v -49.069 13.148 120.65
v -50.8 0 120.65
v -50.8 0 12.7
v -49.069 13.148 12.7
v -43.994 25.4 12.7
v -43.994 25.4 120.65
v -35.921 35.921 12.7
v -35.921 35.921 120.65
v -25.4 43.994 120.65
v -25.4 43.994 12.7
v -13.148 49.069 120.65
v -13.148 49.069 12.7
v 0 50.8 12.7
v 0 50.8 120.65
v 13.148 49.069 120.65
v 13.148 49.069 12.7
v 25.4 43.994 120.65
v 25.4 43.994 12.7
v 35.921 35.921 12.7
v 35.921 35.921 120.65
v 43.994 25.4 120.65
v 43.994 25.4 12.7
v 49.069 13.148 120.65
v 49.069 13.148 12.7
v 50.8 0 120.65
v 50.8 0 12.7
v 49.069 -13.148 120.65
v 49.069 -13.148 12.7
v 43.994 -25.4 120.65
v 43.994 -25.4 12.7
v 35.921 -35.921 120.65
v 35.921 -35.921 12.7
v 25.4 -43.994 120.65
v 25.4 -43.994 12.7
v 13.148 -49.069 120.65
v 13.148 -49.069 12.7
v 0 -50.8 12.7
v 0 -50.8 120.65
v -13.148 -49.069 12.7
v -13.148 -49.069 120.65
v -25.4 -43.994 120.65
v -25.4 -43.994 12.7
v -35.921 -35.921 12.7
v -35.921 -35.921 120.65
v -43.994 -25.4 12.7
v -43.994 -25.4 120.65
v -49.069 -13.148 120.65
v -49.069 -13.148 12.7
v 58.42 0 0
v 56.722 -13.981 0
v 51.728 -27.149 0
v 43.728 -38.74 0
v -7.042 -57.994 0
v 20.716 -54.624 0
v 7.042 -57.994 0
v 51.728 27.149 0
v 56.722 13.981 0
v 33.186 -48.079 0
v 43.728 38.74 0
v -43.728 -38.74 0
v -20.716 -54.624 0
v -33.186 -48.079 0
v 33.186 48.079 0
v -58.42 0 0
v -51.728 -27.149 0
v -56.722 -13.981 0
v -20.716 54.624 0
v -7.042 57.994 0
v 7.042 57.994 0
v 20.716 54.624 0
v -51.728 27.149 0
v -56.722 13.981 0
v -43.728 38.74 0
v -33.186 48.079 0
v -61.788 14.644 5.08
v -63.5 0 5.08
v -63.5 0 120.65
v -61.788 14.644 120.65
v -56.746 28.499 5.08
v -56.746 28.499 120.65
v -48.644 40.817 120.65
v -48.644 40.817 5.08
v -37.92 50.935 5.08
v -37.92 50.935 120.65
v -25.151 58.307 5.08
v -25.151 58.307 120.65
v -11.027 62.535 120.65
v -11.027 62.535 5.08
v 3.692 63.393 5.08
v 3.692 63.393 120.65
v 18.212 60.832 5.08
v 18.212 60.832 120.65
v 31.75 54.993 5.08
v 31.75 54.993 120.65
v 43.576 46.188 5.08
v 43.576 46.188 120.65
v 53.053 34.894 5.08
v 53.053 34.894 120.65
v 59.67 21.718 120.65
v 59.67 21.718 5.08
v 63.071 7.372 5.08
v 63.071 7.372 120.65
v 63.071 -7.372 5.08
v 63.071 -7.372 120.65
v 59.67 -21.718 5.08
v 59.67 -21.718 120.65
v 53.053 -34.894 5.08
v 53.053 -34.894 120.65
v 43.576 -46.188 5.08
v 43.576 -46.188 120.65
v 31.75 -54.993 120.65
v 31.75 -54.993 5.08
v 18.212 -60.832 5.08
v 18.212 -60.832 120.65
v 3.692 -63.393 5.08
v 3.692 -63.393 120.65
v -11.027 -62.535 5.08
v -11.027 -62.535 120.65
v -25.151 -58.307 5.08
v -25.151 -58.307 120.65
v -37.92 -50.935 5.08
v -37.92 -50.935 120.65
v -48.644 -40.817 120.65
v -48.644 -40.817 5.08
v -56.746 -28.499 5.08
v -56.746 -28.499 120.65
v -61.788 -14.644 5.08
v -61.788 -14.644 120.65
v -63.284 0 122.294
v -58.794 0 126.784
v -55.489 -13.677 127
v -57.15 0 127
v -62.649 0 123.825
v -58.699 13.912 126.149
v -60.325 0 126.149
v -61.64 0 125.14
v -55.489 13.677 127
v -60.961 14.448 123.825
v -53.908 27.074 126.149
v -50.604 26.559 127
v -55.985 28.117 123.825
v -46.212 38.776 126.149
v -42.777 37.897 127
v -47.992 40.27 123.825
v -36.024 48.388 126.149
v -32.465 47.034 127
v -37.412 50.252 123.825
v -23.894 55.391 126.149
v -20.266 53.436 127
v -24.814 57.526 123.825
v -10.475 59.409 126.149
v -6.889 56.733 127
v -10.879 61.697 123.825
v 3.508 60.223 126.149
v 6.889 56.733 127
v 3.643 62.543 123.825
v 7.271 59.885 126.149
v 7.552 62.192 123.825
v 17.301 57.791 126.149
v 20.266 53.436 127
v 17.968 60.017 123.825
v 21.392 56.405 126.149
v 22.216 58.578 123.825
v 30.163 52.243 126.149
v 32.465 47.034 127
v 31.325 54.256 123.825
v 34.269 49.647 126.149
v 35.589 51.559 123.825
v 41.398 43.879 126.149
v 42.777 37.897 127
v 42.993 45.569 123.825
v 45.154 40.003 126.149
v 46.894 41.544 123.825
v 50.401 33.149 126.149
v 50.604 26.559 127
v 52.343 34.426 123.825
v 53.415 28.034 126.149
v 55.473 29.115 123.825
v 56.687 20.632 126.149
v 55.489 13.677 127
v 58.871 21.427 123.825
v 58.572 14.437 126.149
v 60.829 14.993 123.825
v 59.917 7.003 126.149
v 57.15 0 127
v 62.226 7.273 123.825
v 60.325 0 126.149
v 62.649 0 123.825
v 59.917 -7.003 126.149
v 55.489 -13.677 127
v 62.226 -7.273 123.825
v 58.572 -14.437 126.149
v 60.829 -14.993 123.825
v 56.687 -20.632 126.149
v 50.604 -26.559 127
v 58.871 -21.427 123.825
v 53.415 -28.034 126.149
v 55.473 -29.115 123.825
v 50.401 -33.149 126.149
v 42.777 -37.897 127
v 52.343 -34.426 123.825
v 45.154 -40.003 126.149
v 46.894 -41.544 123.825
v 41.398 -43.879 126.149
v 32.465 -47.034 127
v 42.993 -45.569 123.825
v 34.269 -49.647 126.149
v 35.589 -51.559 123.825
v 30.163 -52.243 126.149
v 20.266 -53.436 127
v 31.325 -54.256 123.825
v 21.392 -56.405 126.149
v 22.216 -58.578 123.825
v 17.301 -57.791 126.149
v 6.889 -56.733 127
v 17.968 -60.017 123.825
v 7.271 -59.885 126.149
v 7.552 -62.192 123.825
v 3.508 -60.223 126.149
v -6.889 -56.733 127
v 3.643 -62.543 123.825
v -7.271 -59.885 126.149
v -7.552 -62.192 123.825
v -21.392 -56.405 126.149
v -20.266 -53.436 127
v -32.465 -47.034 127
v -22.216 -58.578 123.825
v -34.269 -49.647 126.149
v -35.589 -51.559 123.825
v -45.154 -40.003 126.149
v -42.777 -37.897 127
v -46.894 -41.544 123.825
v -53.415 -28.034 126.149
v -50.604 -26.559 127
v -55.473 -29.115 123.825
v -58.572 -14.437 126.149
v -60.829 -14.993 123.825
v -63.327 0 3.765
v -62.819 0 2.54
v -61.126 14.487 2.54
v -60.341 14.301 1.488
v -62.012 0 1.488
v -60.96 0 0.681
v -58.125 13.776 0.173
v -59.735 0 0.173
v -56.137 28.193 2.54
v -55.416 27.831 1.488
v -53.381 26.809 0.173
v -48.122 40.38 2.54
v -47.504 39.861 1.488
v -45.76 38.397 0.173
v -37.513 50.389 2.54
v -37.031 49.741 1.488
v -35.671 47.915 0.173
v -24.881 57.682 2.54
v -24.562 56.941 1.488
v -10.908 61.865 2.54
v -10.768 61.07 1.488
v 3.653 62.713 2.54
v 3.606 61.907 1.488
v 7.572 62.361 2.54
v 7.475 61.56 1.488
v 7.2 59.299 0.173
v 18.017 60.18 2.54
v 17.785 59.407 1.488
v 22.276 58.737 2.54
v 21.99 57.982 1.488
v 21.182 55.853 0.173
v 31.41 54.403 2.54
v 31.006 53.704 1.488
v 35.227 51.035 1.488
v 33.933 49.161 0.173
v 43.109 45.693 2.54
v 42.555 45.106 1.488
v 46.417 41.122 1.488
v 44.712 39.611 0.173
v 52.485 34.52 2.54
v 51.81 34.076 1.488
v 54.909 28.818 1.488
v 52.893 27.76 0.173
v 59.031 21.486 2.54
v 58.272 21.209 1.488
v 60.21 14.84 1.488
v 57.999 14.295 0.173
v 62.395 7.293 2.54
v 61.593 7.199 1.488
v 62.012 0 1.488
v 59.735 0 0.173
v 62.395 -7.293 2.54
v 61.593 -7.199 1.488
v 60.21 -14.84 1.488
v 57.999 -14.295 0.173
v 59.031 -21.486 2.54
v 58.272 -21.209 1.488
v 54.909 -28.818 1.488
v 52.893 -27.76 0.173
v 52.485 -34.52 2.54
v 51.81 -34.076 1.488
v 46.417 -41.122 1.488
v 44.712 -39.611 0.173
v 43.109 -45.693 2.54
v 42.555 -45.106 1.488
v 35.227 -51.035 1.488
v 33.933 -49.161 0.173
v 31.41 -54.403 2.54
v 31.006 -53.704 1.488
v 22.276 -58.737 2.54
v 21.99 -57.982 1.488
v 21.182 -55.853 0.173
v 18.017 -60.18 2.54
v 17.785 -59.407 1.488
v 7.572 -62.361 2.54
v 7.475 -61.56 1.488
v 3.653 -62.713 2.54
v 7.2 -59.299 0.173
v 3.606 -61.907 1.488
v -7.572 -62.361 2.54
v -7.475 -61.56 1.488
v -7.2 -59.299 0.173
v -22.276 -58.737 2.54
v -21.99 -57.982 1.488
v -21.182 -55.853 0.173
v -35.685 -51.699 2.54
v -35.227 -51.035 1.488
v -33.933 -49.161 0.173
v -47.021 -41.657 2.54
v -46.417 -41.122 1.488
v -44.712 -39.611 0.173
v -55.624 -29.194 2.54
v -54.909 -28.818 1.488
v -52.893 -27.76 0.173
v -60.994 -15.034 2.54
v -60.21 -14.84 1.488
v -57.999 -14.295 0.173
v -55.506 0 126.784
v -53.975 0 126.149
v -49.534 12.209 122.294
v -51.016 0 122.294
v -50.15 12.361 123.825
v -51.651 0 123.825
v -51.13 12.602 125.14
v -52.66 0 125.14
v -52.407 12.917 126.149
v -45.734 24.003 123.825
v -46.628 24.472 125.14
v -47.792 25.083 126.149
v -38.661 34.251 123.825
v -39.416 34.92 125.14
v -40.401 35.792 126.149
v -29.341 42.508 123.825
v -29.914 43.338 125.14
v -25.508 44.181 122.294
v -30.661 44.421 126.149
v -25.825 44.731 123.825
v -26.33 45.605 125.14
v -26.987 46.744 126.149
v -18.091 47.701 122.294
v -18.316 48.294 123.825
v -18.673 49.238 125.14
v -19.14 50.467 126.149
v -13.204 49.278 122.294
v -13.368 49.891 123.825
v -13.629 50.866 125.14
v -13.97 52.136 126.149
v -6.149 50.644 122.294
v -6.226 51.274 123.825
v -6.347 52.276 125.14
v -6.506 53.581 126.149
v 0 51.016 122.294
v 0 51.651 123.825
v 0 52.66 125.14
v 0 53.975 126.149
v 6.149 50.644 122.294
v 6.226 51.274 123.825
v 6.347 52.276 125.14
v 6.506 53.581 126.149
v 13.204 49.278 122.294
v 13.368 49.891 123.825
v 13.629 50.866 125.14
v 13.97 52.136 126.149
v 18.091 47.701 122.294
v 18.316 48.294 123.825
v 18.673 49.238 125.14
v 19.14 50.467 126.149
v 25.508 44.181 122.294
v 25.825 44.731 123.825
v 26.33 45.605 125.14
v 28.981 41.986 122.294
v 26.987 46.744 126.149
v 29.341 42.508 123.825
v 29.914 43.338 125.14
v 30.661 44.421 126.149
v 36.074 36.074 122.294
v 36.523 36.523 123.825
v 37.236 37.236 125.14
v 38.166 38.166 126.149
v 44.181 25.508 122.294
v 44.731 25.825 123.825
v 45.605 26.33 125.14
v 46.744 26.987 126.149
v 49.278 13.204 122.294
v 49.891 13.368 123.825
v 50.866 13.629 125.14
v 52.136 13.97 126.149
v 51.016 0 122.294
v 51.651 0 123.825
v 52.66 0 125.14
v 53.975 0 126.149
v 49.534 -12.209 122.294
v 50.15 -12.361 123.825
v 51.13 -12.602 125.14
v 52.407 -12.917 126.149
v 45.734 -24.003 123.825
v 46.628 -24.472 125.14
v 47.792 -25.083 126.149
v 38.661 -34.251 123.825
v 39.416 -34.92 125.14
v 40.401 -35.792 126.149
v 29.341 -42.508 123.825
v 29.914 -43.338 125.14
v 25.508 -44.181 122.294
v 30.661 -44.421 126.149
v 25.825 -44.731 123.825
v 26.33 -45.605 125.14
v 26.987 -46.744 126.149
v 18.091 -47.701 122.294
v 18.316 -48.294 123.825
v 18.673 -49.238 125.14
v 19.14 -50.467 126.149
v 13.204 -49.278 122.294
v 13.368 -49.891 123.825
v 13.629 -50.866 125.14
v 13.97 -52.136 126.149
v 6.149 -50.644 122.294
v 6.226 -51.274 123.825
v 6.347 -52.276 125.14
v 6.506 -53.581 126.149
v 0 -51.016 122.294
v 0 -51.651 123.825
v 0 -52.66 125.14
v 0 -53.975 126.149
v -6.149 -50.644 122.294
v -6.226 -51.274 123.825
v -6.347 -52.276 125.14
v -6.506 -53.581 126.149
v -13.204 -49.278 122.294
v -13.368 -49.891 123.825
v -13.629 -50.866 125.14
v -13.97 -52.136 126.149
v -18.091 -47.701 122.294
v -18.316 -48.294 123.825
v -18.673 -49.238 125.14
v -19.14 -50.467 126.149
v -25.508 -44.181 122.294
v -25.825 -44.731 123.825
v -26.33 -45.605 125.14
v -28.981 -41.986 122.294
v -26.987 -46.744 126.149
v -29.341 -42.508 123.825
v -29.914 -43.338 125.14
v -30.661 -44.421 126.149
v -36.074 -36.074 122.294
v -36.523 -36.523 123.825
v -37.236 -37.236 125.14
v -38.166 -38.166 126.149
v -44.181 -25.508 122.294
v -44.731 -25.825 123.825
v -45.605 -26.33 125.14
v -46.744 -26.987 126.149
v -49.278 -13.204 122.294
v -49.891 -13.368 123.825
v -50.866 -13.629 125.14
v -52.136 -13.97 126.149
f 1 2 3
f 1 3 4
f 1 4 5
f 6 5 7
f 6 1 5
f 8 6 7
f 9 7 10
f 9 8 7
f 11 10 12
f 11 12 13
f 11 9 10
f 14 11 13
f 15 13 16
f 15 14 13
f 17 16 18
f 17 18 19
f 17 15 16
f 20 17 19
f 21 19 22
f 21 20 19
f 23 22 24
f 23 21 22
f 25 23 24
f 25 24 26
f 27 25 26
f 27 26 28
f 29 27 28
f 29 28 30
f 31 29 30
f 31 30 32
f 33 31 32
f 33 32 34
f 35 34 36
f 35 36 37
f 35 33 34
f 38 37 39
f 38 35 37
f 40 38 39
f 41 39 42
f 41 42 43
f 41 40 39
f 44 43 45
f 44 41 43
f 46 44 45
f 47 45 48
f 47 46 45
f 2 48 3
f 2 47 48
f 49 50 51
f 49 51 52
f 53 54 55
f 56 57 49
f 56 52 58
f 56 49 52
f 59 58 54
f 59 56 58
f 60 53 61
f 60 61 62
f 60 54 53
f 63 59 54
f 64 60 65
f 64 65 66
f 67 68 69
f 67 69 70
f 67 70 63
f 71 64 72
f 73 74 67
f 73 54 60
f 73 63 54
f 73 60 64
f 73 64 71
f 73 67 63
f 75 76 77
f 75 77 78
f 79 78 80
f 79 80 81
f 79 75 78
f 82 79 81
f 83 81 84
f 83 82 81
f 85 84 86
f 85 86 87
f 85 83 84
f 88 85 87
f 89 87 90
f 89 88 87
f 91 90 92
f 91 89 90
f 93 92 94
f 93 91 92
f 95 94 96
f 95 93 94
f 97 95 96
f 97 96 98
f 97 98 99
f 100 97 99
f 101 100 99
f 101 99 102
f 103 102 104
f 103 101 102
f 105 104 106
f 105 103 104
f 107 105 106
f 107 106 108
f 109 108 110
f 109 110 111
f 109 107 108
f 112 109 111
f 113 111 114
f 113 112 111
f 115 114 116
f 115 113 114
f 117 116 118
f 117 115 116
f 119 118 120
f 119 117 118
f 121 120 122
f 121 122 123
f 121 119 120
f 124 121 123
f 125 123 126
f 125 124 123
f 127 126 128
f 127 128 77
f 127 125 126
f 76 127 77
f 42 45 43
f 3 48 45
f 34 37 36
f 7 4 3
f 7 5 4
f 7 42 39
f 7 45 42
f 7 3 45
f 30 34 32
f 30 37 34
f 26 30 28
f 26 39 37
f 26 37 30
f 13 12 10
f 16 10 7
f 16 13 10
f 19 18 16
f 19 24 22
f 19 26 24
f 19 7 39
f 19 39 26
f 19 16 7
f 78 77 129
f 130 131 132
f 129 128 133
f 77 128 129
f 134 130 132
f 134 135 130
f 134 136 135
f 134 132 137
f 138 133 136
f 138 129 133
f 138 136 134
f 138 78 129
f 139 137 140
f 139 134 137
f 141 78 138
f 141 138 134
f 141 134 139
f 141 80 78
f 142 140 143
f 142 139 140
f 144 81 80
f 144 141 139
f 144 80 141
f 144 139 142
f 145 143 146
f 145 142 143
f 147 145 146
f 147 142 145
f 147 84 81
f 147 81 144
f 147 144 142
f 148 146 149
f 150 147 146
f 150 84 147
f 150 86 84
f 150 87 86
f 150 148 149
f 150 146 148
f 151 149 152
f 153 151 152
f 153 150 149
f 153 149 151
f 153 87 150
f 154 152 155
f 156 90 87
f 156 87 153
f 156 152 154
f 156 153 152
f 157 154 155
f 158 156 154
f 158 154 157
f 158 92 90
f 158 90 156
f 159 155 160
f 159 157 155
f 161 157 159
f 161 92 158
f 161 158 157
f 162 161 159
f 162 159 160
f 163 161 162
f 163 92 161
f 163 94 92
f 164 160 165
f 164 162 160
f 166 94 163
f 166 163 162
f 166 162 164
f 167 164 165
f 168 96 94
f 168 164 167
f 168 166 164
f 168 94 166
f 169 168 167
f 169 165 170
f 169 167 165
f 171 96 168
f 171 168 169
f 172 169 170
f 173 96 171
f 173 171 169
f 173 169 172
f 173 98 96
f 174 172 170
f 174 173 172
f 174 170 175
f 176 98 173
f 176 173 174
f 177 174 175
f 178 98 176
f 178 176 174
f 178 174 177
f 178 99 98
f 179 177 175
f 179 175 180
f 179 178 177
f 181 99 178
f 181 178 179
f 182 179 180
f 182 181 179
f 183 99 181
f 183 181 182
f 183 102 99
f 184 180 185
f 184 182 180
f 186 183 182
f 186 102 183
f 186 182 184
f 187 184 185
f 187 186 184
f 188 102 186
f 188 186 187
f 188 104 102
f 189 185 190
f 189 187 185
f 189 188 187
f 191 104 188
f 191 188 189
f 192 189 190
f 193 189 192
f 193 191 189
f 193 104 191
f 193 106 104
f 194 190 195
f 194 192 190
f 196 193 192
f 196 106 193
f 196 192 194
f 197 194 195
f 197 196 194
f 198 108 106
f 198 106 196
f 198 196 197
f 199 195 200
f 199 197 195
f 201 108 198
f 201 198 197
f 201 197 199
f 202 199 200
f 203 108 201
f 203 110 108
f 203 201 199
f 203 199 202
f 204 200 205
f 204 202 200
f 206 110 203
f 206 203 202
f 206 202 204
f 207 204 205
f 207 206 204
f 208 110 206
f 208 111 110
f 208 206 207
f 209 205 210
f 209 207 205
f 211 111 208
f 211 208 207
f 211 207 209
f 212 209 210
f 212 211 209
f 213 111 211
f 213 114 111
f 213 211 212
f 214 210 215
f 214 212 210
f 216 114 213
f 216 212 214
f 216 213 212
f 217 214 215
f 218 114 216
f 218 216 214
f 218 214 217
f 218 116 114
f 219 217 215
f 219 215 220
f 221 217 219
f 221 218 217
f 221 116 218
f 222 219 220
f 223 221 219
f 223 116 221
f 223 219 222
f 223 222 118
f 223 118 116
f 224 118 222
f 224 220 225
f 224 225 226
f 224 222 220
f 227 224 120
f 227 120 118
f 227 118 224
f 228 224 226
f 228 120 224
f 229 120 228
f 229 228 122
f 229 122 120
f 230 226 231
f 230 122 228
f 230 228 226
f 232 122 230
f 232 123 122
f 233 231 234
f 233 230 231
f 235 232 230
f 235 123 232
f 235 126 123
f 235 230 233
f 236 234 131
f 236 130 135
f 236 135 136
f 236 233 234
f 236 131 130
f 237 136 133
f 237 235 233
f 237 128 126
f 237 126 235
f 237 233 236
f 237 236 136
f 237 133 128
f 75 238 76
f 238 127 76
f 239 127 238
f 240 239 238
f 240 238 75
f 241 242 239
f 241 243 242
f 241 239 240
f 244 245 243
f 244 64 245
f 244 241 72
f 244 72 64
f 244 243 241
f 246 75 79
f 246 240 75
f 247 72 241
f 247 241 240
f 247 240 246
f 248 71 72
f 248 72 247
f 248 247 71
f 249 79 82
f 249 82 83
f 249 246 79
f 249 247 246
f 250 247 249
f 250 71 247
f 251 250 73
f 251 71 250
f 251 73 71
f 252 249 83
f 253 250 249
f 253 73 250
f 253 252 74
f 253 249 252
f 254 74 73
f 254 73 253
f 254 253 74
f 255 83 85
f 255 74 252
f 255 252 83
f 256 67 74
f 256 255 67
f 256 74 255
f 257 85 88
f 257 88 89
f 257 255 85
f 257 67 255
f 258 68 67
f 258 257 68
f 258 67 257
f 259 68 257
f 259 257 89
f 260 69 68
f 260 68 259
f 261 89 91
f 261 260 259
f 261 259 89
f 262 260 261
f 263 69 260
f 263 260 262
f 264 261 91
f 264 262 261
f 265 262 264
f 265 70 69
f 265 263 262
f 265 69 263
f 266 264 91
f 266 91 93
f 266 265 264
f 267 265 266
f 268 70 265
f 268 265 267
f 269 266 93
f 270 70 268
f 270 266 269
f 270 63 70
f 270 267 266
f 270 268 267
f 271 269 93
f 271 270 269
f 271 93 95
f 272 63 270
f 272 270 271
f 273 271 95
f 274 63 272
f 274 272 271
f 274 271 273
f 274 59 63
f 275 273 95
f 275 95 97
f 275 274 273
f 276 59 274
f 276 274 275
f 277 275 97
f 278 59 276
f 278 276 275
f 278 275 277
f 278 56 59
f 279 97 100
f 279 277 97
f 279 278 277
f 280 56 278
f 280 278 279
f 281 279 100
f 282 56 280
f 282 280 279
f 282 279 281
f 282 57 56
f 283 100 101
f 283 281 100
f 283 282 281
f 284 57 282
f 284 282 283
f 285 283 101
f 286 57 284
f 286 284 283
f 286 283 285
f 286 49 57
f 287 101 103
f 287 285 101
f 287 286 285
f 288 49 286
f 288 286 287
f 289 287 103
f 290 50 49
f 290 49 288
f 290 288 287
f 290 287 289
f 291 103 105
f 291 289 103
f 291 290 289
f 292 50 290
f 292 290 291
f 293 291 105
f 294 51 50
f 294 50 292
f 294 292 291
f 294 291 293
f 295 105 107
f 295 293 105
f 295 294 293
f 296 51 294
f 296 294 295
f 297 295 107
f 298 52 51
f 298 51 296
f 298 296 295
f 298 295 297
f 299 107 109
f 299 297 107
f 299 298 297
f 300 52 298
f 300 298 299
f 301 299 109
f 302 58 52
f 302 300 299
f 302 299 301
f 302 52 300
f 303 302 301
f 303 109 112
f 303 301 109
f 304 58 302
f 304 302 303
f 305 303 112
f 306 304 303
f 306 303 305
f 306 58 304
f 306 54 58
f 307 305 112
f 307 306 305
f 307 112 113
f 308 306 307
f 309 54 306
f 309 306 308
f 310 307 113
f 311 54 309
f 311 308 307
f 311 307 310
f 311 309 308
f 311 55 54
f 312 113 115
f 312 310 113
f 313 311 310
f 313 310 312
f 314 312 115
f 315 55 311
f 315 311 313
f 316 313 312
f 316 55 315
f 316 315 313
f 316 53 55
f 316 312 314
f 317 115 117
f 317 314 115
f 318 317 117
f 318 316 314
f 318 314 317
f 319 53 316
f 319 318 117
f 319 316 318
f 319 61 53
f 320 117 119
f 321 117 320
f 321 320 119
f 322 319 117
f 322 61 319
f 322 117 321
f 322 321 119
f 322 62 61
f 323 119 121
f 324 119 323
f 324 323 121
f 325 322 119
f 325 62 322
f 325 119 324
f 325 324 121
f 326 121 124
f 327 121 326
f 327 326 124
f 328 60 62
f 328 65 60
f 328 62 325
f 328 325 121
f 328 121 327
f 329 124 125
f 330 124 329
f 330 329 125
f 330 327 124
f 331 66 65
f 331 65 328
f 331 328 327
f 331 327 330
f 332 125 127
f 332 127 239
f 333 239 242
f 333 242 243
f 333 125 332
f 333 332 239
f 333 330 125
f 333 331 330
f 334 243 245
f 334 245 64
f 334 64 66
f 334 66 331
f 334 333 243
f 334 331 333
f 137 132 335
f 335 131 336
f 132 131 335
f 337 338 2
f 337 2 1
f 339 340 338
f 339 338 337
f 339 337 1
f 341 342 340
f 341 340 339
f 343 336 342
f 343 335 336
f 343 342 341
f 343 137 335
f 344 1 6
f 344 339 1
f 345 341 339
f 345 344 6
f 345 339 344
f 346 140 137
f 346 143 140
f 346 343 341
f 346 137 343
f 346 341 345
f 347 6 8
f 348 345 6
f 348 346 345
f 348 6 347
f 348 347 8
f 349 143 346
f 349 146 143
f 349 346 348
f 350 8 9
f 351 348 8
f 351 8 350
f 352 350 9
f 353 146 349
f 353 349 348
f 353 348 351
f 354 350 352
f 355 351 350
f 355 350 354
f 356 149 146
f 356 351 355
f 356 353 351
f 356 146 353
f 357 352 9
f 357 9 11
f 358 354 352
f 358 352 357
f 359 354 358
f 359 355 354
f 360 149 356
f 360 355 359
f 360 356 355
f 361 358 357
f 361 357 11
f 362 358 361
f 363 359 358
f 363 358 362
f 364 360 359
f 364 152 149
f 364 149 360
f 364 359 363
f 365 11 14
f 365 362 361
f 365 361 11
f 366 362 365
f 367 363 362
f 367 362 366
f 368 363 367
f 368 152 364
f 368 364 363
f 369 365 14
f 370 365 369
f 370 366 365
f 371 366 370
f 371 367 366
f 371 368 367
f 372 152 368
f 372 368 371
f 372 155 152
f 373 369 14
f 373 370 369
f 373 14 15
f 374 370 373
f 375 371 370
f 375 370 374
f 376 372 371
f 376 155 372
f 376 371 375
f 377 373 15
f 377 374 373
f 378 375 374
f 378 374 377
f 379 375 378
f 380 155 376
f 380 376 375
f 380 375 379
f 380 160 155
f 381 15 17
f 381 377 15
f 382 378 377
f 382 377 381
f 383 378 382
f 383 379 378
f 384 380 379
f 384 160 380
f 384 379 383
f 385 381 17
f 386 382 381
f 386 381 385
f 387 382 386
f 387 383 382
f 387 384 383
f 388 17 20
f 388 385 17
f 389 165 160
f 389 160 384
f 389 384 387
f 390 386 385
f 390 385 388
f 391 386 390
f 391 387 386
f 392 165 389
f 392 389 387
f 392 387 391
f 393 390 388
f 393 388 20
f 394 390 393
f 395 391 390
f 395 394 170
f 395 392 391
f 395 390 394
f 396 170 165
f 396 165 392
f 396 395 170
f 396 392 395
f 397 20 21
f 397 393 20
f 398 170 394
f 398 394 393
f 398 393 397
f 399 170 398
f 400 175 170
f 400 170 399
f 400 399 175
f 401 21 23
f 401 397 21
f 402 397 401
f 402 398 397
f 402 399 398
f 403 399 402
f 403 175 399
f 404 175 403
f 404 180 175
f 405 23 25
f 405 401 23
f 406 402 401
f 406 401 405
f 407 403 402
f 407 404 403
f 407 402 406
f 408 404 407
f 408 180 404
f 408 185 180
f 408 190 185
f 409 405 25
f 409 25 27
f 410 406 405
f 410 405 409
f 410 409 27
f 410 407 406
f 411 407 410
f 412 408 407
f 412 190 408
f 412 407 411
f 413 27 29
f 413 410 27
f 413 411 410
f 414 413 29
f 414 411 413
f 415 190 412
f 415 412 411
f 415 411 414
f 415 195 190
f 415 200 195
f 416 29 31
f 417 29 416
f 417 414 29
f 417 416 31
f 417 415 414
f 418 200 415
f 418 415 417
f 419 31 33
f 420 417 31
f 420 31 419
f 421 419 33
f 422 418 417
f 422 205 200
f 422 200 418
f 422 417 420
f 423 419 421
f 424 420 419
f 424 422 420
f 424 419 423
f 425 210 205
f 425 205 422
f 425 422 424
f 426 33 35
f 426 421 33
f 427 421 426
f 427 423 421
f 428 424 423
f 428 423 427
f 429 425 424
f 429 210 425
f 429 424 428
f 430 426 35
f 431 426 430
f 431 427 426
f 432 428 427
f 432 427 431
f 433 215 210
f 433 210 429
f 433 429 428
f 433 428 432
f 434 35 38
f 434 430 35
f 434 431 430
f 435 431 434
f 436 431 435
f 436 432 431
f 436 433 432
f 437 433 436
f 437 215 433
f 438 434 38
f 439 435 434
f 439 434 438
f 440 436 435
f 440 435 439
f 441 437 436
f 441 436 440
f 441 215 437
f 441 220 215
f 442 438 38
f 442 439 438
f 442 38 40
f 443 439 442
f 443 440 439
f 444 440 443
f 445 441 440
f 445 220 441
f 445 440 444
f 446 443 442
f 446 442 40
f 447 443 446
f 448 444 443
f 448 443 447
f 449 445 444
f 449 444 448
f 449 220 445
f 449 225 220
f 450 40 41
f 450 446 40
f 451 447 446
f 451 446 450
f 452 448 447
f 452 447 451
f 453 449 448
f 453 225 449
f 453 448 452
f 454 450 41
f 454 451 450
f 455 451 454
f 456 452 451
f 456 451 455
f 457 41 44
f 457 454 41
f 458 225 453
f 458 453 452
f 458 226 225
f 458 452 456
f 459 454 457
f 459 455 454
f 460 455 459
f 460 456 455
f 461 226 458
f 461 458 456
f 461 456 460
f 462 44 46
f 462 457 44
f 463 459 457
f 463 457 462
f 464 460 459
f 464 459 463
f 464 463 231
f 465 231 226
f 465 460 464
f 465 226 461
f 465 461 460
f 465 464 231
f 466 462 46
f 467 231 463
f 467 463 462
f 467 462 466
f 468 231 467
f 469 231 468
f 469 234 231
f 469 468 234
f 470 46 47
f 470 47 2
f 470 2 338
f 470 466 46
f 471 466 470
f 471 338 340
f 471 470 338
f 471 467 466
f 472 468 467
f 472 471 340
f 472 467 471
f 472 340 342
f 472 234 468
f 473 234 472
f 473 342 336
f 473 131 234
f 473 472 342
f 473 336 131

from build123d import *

# Parameters (mm, degrees)
F2_R = 6.34999
F3_R = 5.08


# Not quite as in the source:
# - a fillet or chamfer is up to 0.001 mm smaller than in the source, because OpenCascade refuses the exact size


with BuildPart() as f1:
    # F0 (on Front) → F1 (revolve)
    with BuildSketch(Plane.XZ):
        Polygon((-63.5, 0), (0, 0), (0, 12.7), (-50.8, 12.7), (-50.8, 127), (-63.5, 127), align=None)
    revolve(axis=Axis((0, 0, 6.35), (0, 0, -1)))

    # F2 (radius 6.35 in the source; OpenCascade refuses exactly that, so slightly less here)
    f2_edges = [f1.edges().sort_by_distance(p)[0] for p in [
        (63.5, 0, 127),
        (50.8, 0, 127),
    ]]
    fillet(f2_edges, radius=F2_R)

    # F3
    f3_edges = [f1.edges().sort_by_distance(p)[0] for p in [
        (63.5, 0, 0),
    ]]
    fillet(f3_edges, radius=F3_R)


solid = f1.part
